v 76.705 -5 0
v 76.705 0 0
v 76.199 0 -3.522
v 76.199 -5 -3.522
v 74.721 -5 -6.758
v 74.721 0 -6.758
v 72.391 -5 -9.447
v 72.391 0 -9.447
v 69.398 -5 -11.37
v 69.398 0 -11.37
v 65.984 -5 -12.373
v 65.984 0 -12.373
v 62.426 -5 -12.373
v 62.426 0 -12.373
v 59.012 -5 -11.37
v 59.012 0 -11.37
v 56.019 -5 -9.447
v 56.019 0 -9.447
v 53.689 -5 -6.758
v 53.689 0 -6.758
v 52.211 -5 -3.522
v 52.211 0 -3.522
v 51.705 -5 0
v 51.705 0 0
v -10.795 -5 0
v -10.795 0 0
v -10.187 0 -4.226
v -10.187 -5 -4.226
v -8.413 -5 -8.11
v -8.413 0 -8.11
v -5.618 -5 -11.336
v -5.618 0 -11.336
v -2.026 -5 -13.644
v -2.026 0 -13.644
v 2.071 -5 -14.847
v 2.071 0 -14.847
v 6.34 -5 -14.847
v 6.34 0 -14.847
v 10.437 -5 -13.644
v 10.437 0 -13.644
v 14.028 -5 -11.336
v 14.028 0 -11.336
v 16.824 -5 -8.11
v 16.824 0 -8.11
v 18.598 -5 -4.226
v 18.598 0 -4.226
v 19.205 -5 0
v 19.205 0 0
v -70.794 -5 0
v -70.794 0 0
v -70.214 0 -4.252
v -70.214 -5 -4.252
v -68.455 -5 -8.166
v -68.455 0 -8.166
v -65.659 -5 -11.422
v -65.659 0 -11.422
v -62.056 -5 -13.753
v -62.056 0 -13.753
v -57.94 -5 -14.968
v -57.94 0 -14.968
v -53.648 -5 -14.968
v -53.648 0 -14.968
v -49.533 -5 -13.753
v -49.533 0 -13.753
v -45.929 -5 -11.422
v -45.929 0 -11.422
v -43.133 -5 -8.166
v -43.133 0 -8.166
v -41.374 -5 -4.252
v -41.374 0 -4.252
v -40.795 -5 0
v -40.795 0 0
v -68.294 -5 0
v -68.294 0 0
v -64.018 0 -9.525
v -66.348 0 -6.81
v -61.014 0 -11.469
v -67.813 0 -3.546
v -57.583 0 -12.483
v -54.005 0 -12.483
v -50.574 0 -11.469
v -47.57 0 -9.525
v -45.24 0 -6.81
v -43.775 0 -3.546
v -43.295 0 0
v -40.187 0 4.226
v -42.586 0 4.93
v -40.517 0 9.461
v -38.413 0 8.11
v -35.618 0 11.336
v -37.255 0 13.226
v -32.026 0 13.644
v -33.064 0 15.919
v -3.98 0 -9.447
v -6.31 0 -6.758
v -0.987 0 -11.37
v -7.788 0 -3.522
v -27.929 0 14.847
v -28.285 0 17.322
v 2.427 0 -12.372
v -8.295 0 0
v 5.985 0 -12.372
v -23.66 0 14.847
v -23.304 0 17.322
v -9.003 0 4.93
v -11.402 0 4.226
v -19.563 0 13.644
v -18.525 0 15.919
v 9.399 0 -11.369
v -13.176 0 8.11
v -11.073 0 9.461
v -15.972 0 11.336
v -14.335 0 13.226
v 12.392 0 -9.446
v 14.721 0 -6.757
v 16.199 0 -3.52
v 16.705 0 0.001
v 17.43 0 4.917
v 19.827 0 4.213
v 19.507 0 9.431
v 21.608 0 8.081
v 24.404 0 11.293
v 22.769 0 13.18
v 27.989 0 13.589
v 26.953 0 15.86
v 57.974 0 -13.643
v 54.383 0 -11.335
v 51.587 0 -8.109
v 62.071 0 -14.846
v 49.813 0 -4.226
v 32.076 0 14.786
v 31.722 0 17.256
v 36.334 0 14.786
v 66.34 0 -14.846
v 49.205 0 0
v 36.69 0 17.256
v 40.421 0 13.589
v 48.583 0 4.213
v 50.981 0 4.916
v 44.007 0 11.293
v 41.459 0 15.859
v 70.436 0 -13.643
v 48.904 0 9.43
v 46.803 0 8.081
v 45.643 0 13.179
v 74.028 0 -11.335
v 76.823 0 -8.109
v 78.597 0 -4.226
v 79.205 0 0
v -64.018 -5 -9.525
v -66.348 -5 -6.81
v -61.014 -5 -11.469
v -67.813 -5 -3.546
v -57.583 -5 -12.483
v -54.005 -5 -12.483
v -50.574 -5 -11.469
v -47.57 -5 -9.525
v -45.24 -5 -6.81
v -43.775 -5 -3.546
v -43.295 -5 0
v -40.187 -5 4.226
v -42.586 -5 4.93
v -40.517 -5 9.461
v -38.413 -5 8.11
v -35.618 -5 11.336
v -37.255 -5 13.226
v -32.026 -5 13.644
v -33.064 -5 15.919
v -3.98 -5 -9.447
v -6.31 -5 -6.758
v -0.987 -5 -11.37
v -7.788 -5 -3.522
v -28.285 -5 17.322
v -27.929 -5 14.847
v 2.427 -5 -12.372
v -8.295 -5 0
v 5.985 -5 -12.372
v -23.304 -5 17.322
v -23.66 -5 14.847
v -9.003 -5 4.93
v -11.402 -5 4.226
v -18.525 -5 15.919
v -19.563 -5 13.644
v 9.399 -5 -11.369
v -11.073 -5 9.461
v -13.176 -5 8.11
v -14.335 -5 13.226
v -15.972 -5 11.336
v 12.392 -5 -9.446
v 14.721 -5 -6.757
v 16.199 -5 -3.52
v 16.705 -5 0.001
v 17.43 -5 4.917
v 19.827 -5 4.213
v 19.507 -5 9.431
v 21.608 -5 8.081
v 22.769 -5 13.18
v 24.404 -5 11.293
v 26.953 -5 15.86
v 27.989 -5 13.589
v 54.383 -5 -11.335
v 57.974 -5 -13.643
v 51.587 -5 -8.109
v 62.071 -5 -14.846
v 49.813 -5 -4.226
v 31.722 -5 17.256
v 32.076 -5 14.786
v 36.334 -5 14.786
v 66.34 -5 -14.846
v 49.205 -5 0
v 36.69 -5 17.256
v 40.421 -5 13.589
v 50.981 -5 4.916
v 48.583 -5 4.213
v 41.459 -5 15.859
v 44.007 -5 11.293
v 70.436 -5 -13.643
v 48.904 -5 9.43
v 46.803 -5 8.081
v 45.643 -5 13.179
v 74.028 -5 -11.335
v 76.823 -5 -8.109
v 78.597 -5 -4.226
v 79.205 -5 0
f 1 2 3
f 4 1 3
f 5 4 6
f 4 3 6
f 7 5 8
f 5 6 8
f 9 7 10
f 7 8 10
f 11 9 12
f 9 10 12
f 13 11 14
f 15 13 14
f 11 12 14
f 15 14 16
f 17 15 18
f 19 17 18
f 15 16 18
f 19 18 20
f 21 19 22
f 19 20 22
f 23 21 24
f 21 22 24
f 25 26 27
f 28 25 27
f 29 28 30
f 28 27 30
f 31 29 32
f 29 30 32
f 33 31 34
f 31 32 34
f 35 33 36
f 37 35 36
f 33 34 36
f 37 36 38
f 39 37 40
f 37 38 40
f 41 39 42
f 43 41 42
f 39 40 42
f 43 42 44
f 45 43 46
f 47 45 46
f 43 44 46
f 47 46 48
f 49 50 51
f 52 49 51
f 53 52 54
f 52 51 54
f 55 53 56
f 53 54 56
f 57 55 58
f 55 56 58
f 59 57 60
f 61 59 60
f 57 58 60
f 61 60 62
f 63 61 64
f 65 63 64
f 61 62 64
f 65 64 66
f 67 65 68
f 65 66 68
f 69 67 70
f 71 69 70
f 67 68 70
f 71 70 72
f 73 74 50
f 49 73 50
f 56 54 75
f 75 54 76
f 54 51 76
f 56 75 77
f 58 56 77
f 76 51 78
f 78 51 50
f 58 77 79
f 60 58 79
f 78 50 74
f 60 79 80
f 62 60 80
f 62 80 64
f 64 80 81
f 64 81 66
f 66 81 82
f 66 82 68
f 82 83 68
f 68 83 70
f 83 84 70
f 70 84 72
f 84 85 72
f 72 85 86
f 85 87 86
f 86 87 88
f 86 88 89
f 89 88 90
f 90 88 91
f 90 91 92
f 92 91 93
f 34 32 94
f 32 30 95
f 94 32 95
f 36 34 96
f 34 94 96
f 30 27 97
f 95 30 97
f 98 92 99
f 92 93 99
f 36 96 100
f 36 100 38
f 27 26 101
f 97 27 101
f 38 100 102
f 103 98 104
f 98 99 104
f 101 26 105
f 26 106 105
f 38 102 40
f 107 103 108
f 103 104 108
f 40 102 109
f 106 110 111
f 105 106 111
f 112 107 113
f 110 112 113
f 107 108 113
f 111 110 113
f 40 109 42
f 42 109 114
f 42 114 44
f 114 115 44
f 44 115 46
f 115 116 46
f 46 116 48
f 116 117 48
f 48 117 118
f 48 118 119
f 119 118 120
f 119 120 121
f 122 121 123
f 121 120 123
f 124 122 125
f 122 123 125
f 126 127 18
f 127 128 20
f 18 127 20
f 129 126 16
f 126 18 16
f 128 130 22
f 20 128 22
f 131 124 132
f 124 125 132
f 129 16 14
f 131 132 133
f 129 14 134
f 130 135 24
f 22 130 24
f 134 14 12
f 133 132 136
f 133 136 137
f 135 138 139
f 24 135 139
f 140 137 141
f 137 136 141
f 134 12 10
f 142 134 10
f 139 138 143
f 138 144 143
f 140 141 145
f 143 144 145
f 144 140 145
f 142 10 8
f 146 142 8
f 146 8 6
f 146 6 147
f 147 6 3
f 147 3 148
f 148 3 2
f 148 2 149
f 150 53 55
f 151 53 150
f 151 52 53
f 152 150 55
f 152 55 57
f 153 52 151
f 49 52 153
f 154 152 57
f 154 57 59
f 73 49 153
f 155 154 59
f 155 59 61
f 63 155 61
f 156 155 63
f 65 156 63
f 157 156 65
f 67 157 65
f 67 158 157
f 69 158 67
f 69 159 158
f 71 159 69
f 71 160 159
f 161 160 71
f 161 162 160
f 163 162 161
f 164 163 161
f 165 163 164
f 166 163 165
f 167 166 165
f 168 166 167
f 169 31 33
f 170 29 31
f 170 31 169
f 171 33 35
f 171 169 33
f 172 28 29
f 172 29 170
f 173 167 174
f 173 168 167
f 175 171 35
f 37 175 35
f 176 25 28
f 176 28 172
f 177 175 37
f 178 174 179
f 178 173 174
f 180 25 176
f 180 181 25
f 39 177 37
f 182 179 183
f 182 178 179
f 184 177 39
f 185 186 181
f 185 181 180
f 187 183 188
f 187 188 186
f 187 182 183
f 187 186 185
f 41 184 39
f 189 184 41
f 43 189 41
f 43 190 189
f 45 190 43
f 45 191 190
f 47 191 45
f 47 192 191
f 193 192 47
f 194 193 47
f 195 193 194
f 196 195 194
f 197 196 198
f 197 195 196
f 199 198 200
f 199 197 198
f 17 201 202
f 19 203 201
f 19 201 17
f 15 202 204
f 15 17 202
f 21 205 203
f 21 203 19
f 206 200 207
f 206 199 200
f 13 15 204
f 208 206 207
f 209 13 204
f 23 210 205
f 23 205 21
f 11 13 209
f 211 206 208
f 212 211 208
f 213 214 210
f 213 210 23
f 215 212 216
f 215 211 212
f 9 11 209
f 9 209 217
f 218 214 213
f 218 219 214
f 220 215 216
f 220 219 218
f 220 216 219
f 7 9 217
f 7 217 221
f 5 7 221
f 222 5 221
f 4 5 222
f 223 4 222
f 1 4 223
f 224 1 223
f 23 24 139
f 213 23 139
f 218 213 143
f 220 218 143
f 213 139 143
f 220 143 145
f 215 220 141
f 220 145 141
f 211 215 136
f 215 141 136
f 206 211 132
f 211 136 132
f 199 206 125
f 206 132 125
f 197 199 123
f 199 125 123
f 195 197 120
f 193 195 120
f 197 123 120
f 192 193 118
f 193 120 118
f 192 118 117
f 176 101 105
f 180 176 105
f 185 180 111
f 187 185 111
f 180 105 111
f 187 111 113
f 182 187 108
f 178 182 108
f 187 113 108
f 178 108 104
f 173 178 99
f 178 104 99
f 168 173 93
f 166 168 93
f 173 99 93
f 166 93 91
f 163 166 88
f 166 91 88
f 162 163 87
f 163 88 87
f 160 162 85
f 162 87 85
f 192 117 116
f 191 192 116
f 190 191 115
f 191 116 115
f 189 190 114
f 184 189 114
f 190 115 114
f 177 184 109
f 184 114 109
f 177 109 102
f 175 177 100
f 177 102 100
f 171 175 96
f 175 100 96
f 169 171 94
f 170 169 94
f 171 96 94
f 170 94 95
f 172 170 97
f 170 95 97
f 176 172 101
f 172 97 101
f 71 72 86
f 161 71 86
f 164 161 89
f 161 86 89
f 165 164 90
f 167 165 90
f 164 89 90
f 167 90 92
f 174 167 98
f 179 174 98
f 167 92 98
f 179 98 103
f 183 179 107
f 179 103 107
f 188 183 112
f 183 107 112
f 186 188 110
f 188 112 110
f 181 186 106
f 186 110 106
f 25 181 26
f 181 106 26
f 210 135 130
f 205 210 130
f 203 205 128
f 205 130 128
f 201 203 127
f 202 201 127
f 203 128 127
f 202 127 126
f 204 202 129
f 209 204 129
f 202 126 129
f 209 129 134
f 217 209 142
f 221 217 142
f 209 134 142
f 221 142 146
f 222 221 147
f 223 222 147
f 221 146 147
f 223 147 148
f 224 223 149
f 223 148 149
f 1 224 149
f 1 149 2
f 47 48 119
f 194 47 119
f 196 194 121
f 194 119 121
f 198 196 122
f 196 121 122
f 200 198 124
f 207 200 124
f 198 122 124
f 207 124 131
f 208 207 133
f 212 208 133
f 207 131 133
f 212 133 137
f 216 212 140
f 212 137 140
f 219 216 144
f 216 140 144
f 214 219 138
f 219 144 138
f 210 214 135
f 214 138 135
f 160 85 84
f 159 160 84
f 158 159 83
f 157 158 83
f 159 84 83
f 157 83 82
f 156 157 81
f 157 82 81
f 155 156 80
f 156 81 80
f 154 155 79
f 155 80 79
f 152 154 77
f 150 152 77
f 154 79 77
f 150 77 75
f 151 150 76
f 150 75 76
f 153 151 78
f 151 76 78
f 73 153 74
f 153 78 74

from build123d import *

# Parameters (mm, degrees)
F1_DEPTH = 5


# Not quite as in the source:
# - ends of sketch curves that miss each other by under 0.0002 mm in the source are joined


with BuildPart() as f1:
    # F0 (on Front) → F1 (new body)
    with BuildSketch(Plane.XZ):
        with BuildLine():
            Line((-8.2946076301, 0), (-10.7946076301, 0))
            ThreePointArc((-10.7946076301, 0), (4.2053923699, -15), (19.2053923699, 0))
            Line((19.2053923699, 0), (16.705392798, 0.0014630326))
            ThreePointArc((16.705392798, 0.0014630326), (4.2061241002, -12.4992684623), (-8.2946076301, 0))
        make_face()
        with BuildLine():
            ThreePointArc((-40.7946076301, 0), (-25.7946076301, 15), (-10.7946076301, 0))
            Line((-10.7946076301, 0), (-8.2946076301, 0))
            ThreePointArc((-8.2946076301, 0), (-25.7946076301, 17.5), (-43.2946076301, 0))
            Line((-43.2946076301, 0), (-40.7946076301, 0))
        make_face()
        with BuildLine():
            ThreePointArc((-70.7936146824, 0), (-55.7941111563, -15.1220408499), (-40.7946076301, 0))
            Line((-40.7946076301, 0), (-43.2946076301, 0))
            ThreePointArc((-43.2946076301, 0), (-55.7941111563, -12.6114073597), (-68.2936146824, 0))
            Line((-68.2936146824, 0), (-70.7936146824, 0))
        make_face()
        with BuildLine():
            Line((16.705392798, 0.0014630326), (19.2053923699, 0))
            ThreePointArc((19.2053923699, 0), (34.2052637046, 14.9378715725), (49.2051350393, 0))
            Line((49.2051350393, 0), (51.7051350393, 0))
            ThreePointArc((51.7051350393, 0), (34.205992633, 17.4335732975), (16.705392798, 0.0014630326))
        make_face()
        with BuildLine():
            Line((51.7051350393, 0), (49.2051350393, 0))
            ThreePointArc((49.2051350393, 0), (50.4551350393, -0.0521740711), (51.7051350393, 0))
        make_face()
        with BuildLine():
            ThreePointArc((51.7051350393, 0), (50.4551350393, -0.0521740711), (49.2051350393, 0))
            ThreePointArc((49.2051350393, 0), (64.205134968, -14.9985369674), (79.2051348966, 0))
            Line((79.2051348966, 0), (76.7051348966, 0))
            ThreePointArc((76.705134968, 0), (64.205134968, -12.5), (51.705134968, 0))
        make_face()
    extrude(amount=F1_DEPTH)


solid = f1.part
